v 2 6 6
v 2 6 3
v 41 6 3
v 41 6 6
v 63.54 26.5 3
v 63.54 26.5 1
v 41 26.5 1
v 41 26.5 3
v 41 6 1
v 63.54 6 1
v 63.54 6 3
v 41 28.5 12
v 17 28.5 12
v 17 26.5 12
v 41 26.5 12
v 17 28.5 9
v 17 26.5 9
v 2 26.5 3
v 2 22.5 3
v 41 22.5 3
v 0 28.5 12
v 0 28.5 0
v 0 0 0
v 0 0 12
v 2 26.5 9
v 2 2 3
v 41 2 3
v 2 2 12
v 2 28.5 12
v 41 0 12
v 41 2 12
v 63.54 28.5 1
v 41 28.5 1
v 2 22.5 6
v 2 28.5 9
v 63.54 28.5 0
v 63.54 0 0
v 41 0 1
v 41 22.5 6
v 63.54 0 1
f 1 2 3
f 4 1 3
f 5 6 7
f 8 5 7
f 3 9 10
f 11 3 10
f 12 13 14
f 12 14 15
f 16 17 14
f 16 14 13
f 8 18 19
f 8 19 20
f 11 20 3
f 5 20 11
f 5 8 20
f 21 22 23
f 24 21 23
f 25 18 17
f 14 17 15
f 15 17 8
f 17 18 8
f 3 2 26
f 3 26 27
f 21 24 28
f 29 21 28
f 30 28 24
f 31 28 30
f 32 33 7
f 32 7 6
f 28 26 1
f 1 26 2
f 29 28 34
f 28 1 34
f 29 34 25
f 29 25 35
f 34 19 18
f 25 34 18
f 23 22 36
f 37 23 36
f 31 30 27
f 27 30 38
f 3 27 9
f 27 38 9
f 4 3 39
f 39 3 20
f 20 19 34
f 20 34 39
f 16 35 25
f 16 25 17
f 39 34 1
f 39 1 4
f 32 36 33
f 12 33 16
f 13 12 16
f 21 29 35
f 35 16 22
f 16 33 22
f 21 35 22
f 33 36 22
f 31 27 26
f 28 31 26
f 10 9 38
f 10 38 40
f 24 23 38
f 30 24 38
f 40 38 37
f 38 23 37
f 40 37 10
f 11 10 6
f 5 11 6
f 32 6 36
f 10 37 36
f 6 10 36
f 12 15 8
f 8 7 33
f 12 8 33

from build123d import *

# Parameters (mm, degrees)
F0_W     = 39
F0_H     = 4
F0_W_2   = 2.54
F0_H_2   = 20.5
F1_DEPTH = 3
F0_H_3   = 16.5
F2_DEPTH = 6
F0_W_3   = 15
F0_H_4   = 2
F3_DEPTH = 9
F0_W_4   = 24
F4_DEPTH = 12
F5_DEPTH = 1


with BuildPart() as f1:
    # F0 (on Top) → F1 (new body)
    with BuildSketch(Plane.XY):
        Polygon((61, 26.5), (41, 26.5), (41, 22.5), (41, 6), (61, 6), align=None)
        Polygon((17, 26.5), (2, 26.5), (2, 22.5), (41, 22.5), (41, 26.5), align=None)
        with Locations((21.5, 4)):
            Rectangle(F0_W, F0_H)
        with Locations((62.27, 16.25)):
            Rectangle(F0_W_2, F0_H_2)
    extrude(amount=F1_DEPTH)

    # F0 (on Top) → F3 (join)
    with BuildSketch(Plane.XY):
        with Locations((9.5, 27.5)):
            Rectangle(F0_W_3, F0_H_4)
    extrude(amount=F3_DEPTH)



with BuildPart() as f2:
    # F0 (on Top) → F2 (new body)
    with BuildSketch(Plane.XY):
        with Locations((21.5, 14.25)):
            Rectangle(F0_W, F0_H_3)
    extrude(amount=F2_DEPTH)


with BuildPart() as f4:
    # F0 (on Top) → F4 (new body)
    with BuildSketch(Plane.XY):
        with Locations((29, 27.5)):
            Rectangle(F0_W_4, F0_H_4)
        Polygon((2, 22.5), (2, 26.5), (2, 28.5), (0, 28.5), (0, 2), (2, 2), (2, 6), align=None)
        Polygon((41, 2), (2, 2), (0, 2), (0, 0), (41, 0), align=None)
    extrude(amount=F4_DEPTH)


with BuildPart() as f1_1:
    add(f1.part)

    add(f2.part)  # F5 merges F2

    add(f4.part)  # F5 merges F4
    # F0 (on Top) → F5 (join)
    with BuildSketch(Plane.XY):
        Polygon((41, 28.5), (41, 26.5), (61, 26.5), (63.54, 26.5), (63.54, 28.5), align=None)
        Polygon((61, 6), (41, 6), (41, 2), (41, 0), (63.54, 0), (63.54, 6), align=None)
    extrude(amount=F5_DEPTH)


solid = f1_1.part
